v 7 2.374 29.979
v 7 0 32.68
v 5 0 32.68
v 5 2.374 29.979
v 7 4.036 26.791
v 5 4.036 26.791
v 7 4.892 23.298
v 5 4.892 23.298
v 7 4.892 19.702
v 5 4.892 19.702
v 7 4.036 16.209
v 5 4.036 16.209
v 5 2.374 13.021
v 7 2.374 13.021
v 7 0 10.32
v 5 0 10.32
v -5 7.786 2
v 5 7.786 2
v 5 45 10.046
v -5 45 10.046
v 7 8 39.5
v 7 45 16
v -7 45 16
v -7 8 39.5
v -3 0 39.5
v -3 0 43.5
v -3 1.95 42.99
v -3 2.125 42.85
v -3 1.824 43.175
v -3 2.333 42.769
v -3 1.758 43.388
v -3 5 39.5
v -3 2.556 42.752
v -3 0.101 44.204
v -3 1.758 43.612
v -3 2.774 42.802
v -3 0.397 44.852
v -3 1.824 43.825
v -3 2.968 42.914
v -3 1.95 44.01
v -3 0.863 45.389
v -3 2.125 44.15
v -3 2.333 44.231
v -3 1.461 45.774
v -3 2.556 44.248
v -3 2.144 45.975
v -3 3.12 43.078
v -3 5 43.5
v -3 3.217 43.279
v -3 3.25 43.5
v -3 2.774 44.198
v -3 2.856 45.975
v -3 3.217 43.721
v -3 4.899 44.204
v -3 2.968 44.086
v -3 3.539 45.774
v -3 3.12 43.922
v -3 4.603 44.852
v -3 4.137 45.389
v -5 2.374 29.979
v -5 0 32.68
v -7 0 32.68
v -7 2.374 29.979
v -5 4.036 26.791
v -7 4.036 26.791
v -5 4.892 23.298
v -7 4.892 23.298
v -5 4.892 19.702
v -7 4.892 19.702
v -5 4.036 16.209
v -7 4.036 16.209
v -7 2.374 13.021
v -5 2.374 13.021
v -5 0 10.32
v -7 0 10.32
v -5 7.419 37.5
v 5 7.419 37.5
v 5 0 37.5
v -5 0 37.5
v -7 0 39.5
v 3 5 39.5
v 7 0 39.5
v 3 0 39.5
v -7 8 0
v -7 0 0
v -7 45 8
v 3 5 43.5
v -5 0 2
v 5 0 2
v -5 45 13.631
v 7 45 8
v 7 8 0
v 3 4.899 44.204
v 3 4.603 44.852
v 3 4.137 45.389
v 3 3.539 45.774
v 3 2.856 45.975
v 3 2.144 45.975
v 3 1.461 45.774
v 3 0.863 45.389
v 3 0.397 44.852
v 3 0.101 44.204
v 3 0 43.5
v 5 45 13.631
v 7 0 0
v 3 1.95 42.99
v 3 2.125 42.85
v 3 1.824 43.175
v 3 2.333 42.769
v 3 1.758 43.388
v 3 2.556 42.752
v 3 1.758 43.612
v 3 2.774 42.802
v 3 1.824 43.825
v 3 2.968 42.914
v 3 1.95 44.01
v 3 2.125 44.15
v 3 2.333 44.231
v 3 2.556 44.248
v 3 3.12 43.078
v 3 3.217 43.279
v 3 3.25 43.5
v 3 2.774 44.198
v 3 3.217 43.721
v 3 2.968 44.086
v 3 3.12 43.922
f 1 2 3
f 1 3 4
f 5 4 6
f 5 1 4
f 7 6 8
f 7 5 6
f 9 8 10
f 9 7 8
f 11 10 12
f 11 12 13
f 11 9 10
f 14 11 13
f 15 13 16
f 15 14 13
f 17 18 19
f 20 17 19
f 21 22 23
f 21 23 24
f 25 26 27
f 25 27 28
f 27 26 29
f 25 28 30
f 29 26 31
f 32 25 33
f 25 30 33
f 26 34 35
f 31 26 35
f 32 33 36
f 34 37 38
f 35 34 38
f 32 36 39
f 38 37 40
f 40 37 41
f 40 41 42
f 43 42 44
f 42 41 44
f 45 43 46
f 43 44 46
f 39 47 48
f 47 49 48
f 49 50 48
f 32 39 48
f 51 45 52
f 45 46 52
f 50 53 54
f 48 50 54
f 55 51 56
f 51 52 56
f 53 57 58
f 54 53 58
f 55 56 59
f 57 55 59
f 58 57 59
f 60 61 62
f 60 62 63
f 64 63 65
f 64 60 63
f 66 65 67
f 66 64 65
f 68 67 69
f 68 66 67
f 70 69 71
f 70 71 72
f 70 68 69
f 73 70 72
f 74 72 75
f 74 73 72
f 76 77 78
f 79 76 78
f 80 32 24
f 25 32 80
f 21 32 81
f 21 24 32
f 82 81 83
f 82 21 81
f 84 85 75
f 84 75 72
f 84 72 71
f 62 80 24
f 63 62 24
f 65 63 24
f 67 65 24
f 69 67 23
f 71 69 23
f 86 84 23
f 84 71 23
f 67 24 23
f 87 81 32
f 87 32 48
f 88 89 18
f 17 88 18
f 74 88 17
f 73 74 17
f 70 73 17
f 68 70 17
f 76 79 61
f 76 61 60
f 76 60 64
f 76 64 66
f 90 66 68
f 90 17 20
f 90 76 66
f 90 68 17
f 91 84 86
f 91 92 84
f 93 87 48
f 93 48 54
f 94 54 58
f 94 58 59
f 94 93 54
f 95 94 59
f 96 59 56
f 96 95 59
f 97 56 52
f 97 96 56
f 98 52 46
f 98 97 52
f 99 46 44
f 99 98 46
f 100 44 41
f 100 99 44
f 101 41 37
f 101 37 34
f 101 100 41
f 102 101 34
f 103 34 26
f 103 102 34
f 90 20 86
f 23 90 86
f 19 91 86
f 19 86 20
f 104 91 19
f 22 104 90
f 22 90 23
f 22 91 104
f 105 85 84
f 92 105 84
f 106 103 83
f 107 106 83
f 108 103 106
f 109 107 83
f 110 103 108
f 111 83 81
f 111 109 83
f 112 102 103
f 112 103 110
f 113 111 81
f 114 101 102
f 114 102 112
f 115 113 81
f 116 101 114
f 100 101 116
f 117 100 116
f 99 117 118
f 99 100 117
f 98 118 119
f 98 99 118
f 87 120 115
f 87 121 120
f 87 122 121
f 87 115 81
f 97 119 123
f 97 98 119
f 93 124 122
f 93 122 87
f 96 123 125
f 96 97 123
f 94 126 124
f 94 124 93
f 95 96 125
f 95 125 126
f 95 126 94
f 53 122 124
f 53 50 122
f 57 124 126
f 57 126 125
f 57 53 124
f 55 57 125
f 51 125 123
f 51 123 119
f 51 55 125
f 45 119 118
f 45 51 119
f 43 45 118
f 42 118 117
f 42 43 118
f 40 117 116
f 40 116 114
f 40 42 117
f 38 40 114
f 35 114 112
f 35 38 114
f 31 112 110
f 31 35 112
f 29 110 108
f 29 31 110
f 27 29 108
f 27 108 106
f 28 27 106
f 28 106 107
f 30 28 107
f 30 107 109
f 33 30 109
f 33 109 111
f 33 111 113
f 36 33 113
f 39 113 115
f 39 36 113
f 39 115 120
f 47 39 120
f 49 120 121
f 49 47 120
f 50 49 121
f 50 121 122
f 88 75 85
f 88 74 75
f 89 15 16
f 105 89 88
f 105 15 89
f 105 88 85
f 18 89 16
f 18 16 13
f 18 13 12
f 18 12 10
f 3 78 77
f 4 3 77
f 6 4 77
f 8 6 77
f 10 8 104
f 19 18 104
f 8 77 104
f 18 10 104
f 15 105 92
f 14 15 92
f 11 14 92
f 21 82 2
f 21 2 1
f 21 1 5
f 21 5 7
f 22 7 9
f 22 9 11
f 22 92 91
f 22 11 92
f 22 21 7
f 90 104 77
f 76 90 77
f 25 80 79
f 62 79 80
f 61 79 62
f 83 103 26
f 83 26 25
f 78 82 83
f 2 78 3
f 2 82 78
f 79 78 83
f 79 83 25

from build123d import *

# Parameters (mm, degrees)
F1_DEPTH = 7
F2_T     = -2
F3_R     = 0.75
F4_DEPTH = 3


# Not quite as in the source:
# - a feature names something its author has since deleted; it is built from what else it names


with BuildPart() as f1:
    # F0 (on Right) → F1 (new body, symmetric)
    with BuildSketch(Plane.YZ):
        with BuildLine():
            Line((45, 8), (45, 16))
            Line((45, 16), (8, 39.5))
            Line((8, 39.5), (0, 39.5))
            Line((0, 39.5), (0, 32.6803398875))
            ThreePointArc((0, 32.6803398875), (5, 21.5), (0, 10.3196601125))
            Line((0, 10.3196601125), (0, 0))
            Line((0, 0), (8, 0))
            Line((8, 0), (45, 8))
        make_face()
    extrude(amount=F1_DEPTH, both=True)

    # F2
    f2_openings = [f1.faces().sort_by_distance(p)[0] for p in [
        (0, 0, 36.09017),
        (0, 5, 21.5),
        (0, 0, 5.15983),
        (0, 45, 12),
    ]]
    offset(amount=F2_T, openings=f2_openings)

    # F3 (on Right) → F4 (join, symmetric)
    with BuildSketch(Plane.YZ):
        with BuildLine():
            Line((0, 39.5), (5, 39.5))
            Line((5, 39.5), (5, 43.5))
            ThreePointArc((5, 43.5), (2.5, 46), (0, 43.5))
            Line((0, 43.5), (0, 39.5))
        make_face()
        with Locations((2.5, 43.5)):
            Circle(F3_R, mode=Mode.SUBTRACT)
    extrude(amount=F4_DEPTH, both=True)


solid = f1.part
